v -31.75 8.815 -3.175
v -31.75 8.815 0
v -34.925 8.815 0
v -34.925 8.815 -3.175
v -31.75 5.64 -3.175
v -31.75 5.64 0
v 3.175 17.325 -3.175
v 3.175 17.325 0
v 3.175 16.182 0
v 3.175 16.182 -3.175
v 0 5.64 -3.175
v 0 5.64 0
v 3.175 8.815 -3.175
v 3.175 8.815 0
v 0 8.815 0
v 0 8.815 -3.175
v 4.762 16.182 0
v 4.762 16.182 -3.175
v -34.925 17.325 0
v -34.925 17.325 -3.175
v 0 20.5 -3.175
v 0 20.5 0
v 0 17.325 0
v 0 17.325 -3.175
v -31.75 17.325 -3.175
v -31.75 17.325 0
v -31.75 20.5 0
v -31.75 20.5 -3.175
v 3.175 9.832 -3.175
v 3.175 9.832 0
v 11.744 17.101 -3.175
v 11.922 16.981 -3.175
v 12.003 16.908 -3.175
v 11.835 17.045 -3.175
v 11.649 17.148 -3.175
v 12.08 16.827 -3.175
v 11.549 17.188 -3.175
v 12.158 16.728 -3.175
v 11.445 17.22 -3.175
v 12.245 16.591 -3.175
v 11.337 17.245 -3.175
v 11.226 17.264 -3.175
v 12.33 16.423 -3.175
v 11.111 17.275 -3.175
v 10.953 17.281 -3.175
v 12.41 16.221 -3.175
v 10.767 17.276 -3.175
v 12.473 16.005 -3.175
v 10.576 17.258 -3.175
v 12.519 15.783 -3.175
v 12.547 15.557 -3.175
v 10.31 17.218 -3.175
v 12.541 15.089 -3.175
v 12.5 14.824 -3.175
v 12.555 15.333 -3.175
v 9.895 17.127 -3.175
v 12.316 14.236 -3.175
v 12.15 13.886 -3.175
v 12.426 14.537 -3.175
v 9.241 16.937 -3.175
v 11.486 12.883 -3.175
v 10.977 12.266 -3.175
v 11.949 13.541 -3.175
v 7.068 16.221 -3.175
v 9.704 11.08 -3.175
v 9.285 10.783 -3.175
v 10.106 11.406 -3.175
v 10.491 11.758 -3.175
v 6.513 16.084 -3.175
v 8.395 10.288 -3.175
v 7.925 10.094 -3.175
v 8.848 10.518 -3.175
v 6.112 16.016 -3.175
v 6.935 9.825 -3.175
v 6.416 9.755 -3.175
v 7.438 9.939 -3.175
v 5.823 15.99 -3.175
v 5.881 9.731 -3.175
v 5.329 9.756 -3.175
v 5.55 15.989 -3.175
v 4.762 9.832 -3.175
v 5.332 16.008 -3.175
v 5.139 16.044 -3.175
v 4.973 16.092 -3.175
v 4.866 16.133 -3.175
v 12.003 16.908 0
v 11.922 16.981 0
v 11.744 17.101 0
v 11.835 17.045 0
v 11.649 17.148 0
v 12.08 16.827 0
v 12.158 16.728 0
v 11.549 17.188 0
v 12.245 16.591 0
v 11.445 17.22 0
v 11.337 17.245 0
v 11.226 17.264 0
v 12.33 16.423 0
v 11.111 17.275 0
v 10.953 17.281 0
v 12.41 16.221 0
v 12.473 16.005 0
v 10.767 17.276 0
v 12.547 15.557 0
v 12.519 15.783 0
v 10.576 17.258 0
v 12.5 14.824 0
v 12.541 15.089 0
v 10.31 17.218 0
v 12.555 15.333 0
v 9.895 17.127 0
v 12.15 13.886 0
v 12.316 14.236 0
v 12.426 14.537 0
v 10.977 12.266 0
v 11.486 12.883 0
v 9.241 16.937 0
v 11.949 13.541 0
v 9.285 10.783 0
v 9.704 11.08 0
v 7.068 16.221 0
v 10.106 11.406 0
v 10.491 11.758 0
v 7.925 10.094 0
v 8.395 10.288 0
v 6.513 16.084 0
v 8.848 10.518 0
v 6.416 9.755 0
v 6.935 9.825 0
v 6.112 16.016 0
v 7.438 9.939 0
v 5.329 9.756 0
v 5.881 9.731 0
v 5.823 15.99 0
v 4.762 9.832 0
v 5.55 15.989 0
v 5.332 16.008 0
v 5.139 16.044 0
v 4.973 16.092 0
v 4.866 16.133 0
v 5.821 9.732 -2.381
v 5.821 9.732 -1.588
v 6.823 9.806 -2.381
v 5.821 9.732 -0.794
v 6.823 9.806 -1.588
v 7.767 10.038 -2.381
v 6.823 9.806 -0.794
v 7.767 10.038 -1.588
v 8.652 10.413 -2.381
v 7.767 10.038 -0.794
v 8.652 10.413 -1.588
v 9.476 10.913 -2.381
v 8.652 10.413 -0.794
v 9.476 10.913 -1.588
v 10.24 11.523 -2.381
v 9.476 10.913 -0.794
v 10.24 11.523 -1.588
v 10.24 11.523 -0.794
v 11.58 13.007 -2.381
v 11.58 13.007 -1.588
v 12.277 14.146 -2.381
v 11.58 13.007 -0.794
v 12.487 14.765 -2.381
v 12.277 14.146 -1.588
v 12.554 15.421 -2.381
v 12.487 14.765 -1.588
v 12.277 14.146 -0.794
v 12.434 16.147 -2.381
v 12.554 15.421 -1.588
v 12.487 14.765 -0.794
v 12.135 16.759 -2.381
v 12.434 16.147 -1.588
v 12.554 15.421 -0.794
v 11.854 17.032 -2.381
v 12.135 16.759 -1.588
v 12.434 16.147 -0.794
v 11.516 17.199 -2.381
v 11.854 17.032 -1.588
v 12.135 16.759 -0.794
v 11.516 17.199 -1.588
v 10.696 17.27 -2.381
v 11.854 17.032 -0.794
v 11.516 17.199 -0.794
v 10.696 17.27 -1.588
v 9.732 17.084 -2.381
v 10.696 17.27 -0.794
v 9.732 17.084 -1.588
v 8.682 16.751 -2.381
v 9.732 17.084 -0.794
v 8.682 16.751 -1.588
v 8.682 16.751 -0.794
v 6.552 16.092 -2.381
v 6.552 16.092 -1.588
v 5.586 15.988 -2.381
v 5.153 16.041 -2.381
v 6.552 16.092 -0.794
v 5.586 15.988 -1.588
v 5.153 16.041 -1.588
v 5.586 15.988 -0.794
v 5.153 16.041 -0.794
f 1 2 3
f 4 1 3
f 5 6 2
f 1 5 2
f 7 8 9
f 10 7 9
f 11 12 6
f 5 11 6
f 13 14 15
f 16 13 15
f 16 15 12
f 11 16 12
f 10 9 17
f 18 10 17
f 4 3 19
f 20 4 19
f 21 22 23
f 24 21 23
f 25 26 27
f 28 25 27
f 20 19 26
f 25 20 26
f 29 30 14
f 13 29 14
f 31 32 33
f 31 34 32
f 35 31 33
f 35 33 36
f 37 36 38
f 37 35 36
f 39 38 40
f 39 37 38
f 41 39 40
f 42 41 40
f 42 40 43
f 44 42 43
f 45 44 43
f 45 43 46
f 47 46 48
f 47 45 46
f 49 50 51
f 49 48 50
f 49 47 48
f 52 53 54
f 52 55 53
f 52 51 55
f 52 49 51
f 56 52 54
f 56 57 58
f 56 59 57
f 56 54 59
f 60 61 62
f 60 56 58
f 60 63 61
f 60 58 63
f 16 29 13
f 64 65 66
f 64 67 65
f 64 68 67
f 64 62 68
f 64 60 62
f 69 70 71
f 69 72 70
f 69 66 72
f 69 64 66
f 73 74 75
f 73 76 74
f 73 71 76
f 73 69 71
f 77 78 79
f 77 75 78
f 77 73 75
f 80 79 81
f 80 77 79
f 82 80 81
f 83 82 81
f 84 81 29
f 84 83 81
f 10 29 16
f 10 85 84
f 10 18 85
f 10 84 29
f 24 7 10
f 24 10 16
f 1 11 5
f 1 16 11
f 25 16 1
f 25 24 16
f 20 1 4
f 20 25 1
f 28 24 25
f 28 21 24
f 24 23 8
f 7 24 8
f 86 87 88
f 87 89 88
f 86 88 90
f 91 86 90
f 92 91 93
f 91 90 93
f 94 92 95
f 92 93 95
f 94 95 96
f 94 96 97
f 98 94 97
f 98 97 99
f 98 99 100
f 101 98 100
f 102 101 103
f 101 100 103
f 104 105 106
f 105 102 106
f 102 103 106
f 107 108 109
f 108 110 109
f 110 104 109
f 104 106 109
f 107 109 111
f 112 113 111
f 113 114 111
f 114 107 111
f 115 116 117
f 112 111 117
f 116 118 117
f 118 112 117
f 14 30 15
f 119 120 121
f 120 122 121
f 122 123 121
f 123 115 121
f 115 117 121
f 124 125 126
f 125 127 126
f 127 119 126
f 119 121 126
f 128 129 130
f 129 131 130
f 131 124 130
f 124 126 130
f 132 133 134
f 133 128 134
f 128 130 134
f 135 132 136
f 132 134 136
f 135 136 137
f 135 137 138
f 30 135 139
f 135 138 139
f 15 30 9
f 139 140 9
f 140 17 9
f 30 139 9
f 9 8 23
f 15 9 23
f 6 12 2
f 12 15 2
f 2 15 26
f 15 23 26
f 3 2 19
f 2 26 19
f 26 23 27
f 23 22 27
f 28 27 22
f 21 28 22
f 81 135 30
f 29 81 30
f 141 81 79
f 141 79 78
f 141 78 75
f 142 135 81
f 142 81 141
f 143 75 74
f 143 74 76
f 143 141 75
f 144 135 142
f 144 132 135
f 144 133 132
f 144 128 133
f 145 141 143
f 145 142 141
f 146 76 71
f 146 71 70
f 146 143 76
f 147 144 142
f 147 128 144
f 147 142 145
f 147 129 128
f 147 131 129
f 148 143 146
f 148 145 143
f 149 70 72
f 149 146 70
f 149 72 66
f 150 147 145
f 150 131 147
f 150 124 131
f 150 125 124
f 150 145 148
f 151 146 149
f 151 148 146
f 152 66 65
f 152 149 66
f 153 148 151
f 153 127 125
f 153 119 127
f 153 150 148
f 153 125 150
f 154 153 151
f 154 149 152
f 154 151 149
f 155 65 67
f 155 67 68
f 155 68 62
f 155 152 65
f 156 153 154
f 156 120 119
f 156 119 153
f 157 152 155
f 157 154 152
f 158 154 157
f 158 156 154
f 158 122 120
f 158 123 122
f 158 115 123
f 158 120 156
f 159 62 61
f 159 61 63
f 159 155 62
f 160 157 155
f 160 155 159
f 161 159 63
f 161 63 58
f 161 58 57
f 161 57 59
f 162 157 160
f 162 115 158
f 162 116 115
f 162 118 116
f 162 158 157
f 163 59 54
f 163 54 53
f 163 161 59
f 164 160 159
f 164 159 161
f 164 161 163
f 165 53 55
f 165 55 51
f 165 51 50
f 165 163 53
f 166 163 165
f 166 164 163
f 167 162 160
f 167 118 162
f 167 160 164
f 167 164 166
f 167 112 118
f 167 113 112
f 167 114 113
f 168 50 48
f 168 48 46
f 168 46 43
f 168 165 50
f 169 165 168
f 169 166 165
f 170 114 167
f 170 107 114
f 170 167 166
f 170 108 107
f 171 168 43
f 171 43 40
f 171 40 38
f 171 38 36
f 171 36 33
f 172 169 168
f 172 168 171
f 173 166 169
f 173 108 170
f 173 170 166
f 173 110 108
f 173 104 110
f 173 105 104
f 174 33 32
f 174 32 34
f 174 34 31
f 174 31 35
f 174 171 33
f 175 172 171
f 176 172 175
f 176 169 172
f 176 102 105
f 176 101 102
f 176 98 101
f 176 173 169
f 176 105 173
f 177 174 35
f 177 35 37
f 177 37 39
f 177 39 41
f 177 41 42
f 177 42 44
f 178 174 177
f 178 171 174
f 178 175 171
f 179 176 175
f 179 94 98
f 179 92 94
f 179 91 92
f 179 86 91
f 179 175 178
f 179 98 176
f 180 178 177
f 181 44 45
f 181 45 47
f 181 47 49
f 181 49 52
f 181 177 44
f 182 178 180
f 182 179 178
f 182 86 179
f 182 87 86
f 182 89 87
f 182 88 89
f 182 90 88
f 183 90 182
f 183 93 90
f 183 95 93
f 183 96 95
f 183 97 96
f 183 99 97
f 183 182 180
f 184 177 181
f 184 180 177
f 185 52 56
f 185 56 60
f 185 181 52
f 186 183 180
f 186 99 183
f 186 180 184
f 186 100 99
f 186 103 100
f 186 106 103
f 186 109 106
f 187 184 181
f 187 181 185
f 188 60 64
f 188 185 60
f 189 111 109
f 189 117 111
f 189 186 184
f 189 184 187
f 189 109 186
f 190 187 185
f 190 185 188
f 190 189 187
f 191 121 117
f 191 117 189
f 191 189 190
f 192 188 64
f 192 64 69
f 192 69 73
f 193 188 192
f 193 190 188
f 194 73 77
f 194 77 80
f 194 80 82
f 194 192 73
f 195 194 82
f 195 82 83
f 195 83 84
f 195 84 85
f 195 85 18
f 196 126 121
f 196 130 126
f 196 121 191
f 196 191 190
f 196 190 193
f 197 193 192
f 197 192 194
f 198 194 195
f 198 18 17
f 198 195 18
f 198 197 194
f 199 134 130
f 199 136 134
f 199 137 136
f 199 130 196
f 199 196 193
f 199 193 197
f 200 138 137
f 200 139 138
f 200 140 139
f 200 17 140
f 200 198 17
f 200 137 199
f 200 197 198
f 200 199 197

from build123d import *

# Parameters (mm, degrees)
BOSS_EXTRUDE1_DEPTH = 3.175


with BuildPart() as part:
    # Sketch1 → Boss-Extrude1 (new body)
    with BuildSketch(Plane.XY):
        with BuildLine():
            Line((0, 5.639663891), (-31.75, 5.639663891))
            Line((-31.75, 5.639663891), (-31.75, 8.814663891))
            Line((-31.75, 8.814663891), (-34.925, 8.814663891))
            Line((-34.925, 8.814663891), (-34.925, 17.325102195))
            Line((-34.925, 17.325102195), (-31.75, 17.325102195))
            Line((-31.75, 17.325102195), (-31.75, 20.500102195))
            Line((-31.75, 20.500102195), (0, 20.500102195))
            Line((0, 20.500102195), (0, 17.325102195))
            Line((0, 17.325102195), (3.175, 17.325102195))
            Line((3.175, 17.325102195), (3.175, 16.182102195))
            Line((3.175, 16.182102195), (4.7625, 16.182102195))
            add(Edge.make_bspline(
                [(4.7625, 9.832102195), (7.659778086, 9.31714992), (10.728301246, 11.34273023), (12.826116241, 14.945670316), (11.575816546, 19.158870701), (6.71856433, 15.166738189), (4.7625, 16.182102195)],
                knots=[0, 0, 0, 0, 0.407368903, 0.542633112, 0.615483108, 1, 1, 1, 1], degree=3))
            Line((4.7625, 9.832102195), (3.175, 9.832102195))
            Line((3.175, 9.832102195), (3.175, 8.814663891))
            Line((3.175, 8.814663891), (0, 8.814663891))
            Line((0, 8.814663891), (0, 5.639663891))
        make_face()
    extrude(amount=-BOSS_EXTRUDE1_DEPTH)


solid = part.part
